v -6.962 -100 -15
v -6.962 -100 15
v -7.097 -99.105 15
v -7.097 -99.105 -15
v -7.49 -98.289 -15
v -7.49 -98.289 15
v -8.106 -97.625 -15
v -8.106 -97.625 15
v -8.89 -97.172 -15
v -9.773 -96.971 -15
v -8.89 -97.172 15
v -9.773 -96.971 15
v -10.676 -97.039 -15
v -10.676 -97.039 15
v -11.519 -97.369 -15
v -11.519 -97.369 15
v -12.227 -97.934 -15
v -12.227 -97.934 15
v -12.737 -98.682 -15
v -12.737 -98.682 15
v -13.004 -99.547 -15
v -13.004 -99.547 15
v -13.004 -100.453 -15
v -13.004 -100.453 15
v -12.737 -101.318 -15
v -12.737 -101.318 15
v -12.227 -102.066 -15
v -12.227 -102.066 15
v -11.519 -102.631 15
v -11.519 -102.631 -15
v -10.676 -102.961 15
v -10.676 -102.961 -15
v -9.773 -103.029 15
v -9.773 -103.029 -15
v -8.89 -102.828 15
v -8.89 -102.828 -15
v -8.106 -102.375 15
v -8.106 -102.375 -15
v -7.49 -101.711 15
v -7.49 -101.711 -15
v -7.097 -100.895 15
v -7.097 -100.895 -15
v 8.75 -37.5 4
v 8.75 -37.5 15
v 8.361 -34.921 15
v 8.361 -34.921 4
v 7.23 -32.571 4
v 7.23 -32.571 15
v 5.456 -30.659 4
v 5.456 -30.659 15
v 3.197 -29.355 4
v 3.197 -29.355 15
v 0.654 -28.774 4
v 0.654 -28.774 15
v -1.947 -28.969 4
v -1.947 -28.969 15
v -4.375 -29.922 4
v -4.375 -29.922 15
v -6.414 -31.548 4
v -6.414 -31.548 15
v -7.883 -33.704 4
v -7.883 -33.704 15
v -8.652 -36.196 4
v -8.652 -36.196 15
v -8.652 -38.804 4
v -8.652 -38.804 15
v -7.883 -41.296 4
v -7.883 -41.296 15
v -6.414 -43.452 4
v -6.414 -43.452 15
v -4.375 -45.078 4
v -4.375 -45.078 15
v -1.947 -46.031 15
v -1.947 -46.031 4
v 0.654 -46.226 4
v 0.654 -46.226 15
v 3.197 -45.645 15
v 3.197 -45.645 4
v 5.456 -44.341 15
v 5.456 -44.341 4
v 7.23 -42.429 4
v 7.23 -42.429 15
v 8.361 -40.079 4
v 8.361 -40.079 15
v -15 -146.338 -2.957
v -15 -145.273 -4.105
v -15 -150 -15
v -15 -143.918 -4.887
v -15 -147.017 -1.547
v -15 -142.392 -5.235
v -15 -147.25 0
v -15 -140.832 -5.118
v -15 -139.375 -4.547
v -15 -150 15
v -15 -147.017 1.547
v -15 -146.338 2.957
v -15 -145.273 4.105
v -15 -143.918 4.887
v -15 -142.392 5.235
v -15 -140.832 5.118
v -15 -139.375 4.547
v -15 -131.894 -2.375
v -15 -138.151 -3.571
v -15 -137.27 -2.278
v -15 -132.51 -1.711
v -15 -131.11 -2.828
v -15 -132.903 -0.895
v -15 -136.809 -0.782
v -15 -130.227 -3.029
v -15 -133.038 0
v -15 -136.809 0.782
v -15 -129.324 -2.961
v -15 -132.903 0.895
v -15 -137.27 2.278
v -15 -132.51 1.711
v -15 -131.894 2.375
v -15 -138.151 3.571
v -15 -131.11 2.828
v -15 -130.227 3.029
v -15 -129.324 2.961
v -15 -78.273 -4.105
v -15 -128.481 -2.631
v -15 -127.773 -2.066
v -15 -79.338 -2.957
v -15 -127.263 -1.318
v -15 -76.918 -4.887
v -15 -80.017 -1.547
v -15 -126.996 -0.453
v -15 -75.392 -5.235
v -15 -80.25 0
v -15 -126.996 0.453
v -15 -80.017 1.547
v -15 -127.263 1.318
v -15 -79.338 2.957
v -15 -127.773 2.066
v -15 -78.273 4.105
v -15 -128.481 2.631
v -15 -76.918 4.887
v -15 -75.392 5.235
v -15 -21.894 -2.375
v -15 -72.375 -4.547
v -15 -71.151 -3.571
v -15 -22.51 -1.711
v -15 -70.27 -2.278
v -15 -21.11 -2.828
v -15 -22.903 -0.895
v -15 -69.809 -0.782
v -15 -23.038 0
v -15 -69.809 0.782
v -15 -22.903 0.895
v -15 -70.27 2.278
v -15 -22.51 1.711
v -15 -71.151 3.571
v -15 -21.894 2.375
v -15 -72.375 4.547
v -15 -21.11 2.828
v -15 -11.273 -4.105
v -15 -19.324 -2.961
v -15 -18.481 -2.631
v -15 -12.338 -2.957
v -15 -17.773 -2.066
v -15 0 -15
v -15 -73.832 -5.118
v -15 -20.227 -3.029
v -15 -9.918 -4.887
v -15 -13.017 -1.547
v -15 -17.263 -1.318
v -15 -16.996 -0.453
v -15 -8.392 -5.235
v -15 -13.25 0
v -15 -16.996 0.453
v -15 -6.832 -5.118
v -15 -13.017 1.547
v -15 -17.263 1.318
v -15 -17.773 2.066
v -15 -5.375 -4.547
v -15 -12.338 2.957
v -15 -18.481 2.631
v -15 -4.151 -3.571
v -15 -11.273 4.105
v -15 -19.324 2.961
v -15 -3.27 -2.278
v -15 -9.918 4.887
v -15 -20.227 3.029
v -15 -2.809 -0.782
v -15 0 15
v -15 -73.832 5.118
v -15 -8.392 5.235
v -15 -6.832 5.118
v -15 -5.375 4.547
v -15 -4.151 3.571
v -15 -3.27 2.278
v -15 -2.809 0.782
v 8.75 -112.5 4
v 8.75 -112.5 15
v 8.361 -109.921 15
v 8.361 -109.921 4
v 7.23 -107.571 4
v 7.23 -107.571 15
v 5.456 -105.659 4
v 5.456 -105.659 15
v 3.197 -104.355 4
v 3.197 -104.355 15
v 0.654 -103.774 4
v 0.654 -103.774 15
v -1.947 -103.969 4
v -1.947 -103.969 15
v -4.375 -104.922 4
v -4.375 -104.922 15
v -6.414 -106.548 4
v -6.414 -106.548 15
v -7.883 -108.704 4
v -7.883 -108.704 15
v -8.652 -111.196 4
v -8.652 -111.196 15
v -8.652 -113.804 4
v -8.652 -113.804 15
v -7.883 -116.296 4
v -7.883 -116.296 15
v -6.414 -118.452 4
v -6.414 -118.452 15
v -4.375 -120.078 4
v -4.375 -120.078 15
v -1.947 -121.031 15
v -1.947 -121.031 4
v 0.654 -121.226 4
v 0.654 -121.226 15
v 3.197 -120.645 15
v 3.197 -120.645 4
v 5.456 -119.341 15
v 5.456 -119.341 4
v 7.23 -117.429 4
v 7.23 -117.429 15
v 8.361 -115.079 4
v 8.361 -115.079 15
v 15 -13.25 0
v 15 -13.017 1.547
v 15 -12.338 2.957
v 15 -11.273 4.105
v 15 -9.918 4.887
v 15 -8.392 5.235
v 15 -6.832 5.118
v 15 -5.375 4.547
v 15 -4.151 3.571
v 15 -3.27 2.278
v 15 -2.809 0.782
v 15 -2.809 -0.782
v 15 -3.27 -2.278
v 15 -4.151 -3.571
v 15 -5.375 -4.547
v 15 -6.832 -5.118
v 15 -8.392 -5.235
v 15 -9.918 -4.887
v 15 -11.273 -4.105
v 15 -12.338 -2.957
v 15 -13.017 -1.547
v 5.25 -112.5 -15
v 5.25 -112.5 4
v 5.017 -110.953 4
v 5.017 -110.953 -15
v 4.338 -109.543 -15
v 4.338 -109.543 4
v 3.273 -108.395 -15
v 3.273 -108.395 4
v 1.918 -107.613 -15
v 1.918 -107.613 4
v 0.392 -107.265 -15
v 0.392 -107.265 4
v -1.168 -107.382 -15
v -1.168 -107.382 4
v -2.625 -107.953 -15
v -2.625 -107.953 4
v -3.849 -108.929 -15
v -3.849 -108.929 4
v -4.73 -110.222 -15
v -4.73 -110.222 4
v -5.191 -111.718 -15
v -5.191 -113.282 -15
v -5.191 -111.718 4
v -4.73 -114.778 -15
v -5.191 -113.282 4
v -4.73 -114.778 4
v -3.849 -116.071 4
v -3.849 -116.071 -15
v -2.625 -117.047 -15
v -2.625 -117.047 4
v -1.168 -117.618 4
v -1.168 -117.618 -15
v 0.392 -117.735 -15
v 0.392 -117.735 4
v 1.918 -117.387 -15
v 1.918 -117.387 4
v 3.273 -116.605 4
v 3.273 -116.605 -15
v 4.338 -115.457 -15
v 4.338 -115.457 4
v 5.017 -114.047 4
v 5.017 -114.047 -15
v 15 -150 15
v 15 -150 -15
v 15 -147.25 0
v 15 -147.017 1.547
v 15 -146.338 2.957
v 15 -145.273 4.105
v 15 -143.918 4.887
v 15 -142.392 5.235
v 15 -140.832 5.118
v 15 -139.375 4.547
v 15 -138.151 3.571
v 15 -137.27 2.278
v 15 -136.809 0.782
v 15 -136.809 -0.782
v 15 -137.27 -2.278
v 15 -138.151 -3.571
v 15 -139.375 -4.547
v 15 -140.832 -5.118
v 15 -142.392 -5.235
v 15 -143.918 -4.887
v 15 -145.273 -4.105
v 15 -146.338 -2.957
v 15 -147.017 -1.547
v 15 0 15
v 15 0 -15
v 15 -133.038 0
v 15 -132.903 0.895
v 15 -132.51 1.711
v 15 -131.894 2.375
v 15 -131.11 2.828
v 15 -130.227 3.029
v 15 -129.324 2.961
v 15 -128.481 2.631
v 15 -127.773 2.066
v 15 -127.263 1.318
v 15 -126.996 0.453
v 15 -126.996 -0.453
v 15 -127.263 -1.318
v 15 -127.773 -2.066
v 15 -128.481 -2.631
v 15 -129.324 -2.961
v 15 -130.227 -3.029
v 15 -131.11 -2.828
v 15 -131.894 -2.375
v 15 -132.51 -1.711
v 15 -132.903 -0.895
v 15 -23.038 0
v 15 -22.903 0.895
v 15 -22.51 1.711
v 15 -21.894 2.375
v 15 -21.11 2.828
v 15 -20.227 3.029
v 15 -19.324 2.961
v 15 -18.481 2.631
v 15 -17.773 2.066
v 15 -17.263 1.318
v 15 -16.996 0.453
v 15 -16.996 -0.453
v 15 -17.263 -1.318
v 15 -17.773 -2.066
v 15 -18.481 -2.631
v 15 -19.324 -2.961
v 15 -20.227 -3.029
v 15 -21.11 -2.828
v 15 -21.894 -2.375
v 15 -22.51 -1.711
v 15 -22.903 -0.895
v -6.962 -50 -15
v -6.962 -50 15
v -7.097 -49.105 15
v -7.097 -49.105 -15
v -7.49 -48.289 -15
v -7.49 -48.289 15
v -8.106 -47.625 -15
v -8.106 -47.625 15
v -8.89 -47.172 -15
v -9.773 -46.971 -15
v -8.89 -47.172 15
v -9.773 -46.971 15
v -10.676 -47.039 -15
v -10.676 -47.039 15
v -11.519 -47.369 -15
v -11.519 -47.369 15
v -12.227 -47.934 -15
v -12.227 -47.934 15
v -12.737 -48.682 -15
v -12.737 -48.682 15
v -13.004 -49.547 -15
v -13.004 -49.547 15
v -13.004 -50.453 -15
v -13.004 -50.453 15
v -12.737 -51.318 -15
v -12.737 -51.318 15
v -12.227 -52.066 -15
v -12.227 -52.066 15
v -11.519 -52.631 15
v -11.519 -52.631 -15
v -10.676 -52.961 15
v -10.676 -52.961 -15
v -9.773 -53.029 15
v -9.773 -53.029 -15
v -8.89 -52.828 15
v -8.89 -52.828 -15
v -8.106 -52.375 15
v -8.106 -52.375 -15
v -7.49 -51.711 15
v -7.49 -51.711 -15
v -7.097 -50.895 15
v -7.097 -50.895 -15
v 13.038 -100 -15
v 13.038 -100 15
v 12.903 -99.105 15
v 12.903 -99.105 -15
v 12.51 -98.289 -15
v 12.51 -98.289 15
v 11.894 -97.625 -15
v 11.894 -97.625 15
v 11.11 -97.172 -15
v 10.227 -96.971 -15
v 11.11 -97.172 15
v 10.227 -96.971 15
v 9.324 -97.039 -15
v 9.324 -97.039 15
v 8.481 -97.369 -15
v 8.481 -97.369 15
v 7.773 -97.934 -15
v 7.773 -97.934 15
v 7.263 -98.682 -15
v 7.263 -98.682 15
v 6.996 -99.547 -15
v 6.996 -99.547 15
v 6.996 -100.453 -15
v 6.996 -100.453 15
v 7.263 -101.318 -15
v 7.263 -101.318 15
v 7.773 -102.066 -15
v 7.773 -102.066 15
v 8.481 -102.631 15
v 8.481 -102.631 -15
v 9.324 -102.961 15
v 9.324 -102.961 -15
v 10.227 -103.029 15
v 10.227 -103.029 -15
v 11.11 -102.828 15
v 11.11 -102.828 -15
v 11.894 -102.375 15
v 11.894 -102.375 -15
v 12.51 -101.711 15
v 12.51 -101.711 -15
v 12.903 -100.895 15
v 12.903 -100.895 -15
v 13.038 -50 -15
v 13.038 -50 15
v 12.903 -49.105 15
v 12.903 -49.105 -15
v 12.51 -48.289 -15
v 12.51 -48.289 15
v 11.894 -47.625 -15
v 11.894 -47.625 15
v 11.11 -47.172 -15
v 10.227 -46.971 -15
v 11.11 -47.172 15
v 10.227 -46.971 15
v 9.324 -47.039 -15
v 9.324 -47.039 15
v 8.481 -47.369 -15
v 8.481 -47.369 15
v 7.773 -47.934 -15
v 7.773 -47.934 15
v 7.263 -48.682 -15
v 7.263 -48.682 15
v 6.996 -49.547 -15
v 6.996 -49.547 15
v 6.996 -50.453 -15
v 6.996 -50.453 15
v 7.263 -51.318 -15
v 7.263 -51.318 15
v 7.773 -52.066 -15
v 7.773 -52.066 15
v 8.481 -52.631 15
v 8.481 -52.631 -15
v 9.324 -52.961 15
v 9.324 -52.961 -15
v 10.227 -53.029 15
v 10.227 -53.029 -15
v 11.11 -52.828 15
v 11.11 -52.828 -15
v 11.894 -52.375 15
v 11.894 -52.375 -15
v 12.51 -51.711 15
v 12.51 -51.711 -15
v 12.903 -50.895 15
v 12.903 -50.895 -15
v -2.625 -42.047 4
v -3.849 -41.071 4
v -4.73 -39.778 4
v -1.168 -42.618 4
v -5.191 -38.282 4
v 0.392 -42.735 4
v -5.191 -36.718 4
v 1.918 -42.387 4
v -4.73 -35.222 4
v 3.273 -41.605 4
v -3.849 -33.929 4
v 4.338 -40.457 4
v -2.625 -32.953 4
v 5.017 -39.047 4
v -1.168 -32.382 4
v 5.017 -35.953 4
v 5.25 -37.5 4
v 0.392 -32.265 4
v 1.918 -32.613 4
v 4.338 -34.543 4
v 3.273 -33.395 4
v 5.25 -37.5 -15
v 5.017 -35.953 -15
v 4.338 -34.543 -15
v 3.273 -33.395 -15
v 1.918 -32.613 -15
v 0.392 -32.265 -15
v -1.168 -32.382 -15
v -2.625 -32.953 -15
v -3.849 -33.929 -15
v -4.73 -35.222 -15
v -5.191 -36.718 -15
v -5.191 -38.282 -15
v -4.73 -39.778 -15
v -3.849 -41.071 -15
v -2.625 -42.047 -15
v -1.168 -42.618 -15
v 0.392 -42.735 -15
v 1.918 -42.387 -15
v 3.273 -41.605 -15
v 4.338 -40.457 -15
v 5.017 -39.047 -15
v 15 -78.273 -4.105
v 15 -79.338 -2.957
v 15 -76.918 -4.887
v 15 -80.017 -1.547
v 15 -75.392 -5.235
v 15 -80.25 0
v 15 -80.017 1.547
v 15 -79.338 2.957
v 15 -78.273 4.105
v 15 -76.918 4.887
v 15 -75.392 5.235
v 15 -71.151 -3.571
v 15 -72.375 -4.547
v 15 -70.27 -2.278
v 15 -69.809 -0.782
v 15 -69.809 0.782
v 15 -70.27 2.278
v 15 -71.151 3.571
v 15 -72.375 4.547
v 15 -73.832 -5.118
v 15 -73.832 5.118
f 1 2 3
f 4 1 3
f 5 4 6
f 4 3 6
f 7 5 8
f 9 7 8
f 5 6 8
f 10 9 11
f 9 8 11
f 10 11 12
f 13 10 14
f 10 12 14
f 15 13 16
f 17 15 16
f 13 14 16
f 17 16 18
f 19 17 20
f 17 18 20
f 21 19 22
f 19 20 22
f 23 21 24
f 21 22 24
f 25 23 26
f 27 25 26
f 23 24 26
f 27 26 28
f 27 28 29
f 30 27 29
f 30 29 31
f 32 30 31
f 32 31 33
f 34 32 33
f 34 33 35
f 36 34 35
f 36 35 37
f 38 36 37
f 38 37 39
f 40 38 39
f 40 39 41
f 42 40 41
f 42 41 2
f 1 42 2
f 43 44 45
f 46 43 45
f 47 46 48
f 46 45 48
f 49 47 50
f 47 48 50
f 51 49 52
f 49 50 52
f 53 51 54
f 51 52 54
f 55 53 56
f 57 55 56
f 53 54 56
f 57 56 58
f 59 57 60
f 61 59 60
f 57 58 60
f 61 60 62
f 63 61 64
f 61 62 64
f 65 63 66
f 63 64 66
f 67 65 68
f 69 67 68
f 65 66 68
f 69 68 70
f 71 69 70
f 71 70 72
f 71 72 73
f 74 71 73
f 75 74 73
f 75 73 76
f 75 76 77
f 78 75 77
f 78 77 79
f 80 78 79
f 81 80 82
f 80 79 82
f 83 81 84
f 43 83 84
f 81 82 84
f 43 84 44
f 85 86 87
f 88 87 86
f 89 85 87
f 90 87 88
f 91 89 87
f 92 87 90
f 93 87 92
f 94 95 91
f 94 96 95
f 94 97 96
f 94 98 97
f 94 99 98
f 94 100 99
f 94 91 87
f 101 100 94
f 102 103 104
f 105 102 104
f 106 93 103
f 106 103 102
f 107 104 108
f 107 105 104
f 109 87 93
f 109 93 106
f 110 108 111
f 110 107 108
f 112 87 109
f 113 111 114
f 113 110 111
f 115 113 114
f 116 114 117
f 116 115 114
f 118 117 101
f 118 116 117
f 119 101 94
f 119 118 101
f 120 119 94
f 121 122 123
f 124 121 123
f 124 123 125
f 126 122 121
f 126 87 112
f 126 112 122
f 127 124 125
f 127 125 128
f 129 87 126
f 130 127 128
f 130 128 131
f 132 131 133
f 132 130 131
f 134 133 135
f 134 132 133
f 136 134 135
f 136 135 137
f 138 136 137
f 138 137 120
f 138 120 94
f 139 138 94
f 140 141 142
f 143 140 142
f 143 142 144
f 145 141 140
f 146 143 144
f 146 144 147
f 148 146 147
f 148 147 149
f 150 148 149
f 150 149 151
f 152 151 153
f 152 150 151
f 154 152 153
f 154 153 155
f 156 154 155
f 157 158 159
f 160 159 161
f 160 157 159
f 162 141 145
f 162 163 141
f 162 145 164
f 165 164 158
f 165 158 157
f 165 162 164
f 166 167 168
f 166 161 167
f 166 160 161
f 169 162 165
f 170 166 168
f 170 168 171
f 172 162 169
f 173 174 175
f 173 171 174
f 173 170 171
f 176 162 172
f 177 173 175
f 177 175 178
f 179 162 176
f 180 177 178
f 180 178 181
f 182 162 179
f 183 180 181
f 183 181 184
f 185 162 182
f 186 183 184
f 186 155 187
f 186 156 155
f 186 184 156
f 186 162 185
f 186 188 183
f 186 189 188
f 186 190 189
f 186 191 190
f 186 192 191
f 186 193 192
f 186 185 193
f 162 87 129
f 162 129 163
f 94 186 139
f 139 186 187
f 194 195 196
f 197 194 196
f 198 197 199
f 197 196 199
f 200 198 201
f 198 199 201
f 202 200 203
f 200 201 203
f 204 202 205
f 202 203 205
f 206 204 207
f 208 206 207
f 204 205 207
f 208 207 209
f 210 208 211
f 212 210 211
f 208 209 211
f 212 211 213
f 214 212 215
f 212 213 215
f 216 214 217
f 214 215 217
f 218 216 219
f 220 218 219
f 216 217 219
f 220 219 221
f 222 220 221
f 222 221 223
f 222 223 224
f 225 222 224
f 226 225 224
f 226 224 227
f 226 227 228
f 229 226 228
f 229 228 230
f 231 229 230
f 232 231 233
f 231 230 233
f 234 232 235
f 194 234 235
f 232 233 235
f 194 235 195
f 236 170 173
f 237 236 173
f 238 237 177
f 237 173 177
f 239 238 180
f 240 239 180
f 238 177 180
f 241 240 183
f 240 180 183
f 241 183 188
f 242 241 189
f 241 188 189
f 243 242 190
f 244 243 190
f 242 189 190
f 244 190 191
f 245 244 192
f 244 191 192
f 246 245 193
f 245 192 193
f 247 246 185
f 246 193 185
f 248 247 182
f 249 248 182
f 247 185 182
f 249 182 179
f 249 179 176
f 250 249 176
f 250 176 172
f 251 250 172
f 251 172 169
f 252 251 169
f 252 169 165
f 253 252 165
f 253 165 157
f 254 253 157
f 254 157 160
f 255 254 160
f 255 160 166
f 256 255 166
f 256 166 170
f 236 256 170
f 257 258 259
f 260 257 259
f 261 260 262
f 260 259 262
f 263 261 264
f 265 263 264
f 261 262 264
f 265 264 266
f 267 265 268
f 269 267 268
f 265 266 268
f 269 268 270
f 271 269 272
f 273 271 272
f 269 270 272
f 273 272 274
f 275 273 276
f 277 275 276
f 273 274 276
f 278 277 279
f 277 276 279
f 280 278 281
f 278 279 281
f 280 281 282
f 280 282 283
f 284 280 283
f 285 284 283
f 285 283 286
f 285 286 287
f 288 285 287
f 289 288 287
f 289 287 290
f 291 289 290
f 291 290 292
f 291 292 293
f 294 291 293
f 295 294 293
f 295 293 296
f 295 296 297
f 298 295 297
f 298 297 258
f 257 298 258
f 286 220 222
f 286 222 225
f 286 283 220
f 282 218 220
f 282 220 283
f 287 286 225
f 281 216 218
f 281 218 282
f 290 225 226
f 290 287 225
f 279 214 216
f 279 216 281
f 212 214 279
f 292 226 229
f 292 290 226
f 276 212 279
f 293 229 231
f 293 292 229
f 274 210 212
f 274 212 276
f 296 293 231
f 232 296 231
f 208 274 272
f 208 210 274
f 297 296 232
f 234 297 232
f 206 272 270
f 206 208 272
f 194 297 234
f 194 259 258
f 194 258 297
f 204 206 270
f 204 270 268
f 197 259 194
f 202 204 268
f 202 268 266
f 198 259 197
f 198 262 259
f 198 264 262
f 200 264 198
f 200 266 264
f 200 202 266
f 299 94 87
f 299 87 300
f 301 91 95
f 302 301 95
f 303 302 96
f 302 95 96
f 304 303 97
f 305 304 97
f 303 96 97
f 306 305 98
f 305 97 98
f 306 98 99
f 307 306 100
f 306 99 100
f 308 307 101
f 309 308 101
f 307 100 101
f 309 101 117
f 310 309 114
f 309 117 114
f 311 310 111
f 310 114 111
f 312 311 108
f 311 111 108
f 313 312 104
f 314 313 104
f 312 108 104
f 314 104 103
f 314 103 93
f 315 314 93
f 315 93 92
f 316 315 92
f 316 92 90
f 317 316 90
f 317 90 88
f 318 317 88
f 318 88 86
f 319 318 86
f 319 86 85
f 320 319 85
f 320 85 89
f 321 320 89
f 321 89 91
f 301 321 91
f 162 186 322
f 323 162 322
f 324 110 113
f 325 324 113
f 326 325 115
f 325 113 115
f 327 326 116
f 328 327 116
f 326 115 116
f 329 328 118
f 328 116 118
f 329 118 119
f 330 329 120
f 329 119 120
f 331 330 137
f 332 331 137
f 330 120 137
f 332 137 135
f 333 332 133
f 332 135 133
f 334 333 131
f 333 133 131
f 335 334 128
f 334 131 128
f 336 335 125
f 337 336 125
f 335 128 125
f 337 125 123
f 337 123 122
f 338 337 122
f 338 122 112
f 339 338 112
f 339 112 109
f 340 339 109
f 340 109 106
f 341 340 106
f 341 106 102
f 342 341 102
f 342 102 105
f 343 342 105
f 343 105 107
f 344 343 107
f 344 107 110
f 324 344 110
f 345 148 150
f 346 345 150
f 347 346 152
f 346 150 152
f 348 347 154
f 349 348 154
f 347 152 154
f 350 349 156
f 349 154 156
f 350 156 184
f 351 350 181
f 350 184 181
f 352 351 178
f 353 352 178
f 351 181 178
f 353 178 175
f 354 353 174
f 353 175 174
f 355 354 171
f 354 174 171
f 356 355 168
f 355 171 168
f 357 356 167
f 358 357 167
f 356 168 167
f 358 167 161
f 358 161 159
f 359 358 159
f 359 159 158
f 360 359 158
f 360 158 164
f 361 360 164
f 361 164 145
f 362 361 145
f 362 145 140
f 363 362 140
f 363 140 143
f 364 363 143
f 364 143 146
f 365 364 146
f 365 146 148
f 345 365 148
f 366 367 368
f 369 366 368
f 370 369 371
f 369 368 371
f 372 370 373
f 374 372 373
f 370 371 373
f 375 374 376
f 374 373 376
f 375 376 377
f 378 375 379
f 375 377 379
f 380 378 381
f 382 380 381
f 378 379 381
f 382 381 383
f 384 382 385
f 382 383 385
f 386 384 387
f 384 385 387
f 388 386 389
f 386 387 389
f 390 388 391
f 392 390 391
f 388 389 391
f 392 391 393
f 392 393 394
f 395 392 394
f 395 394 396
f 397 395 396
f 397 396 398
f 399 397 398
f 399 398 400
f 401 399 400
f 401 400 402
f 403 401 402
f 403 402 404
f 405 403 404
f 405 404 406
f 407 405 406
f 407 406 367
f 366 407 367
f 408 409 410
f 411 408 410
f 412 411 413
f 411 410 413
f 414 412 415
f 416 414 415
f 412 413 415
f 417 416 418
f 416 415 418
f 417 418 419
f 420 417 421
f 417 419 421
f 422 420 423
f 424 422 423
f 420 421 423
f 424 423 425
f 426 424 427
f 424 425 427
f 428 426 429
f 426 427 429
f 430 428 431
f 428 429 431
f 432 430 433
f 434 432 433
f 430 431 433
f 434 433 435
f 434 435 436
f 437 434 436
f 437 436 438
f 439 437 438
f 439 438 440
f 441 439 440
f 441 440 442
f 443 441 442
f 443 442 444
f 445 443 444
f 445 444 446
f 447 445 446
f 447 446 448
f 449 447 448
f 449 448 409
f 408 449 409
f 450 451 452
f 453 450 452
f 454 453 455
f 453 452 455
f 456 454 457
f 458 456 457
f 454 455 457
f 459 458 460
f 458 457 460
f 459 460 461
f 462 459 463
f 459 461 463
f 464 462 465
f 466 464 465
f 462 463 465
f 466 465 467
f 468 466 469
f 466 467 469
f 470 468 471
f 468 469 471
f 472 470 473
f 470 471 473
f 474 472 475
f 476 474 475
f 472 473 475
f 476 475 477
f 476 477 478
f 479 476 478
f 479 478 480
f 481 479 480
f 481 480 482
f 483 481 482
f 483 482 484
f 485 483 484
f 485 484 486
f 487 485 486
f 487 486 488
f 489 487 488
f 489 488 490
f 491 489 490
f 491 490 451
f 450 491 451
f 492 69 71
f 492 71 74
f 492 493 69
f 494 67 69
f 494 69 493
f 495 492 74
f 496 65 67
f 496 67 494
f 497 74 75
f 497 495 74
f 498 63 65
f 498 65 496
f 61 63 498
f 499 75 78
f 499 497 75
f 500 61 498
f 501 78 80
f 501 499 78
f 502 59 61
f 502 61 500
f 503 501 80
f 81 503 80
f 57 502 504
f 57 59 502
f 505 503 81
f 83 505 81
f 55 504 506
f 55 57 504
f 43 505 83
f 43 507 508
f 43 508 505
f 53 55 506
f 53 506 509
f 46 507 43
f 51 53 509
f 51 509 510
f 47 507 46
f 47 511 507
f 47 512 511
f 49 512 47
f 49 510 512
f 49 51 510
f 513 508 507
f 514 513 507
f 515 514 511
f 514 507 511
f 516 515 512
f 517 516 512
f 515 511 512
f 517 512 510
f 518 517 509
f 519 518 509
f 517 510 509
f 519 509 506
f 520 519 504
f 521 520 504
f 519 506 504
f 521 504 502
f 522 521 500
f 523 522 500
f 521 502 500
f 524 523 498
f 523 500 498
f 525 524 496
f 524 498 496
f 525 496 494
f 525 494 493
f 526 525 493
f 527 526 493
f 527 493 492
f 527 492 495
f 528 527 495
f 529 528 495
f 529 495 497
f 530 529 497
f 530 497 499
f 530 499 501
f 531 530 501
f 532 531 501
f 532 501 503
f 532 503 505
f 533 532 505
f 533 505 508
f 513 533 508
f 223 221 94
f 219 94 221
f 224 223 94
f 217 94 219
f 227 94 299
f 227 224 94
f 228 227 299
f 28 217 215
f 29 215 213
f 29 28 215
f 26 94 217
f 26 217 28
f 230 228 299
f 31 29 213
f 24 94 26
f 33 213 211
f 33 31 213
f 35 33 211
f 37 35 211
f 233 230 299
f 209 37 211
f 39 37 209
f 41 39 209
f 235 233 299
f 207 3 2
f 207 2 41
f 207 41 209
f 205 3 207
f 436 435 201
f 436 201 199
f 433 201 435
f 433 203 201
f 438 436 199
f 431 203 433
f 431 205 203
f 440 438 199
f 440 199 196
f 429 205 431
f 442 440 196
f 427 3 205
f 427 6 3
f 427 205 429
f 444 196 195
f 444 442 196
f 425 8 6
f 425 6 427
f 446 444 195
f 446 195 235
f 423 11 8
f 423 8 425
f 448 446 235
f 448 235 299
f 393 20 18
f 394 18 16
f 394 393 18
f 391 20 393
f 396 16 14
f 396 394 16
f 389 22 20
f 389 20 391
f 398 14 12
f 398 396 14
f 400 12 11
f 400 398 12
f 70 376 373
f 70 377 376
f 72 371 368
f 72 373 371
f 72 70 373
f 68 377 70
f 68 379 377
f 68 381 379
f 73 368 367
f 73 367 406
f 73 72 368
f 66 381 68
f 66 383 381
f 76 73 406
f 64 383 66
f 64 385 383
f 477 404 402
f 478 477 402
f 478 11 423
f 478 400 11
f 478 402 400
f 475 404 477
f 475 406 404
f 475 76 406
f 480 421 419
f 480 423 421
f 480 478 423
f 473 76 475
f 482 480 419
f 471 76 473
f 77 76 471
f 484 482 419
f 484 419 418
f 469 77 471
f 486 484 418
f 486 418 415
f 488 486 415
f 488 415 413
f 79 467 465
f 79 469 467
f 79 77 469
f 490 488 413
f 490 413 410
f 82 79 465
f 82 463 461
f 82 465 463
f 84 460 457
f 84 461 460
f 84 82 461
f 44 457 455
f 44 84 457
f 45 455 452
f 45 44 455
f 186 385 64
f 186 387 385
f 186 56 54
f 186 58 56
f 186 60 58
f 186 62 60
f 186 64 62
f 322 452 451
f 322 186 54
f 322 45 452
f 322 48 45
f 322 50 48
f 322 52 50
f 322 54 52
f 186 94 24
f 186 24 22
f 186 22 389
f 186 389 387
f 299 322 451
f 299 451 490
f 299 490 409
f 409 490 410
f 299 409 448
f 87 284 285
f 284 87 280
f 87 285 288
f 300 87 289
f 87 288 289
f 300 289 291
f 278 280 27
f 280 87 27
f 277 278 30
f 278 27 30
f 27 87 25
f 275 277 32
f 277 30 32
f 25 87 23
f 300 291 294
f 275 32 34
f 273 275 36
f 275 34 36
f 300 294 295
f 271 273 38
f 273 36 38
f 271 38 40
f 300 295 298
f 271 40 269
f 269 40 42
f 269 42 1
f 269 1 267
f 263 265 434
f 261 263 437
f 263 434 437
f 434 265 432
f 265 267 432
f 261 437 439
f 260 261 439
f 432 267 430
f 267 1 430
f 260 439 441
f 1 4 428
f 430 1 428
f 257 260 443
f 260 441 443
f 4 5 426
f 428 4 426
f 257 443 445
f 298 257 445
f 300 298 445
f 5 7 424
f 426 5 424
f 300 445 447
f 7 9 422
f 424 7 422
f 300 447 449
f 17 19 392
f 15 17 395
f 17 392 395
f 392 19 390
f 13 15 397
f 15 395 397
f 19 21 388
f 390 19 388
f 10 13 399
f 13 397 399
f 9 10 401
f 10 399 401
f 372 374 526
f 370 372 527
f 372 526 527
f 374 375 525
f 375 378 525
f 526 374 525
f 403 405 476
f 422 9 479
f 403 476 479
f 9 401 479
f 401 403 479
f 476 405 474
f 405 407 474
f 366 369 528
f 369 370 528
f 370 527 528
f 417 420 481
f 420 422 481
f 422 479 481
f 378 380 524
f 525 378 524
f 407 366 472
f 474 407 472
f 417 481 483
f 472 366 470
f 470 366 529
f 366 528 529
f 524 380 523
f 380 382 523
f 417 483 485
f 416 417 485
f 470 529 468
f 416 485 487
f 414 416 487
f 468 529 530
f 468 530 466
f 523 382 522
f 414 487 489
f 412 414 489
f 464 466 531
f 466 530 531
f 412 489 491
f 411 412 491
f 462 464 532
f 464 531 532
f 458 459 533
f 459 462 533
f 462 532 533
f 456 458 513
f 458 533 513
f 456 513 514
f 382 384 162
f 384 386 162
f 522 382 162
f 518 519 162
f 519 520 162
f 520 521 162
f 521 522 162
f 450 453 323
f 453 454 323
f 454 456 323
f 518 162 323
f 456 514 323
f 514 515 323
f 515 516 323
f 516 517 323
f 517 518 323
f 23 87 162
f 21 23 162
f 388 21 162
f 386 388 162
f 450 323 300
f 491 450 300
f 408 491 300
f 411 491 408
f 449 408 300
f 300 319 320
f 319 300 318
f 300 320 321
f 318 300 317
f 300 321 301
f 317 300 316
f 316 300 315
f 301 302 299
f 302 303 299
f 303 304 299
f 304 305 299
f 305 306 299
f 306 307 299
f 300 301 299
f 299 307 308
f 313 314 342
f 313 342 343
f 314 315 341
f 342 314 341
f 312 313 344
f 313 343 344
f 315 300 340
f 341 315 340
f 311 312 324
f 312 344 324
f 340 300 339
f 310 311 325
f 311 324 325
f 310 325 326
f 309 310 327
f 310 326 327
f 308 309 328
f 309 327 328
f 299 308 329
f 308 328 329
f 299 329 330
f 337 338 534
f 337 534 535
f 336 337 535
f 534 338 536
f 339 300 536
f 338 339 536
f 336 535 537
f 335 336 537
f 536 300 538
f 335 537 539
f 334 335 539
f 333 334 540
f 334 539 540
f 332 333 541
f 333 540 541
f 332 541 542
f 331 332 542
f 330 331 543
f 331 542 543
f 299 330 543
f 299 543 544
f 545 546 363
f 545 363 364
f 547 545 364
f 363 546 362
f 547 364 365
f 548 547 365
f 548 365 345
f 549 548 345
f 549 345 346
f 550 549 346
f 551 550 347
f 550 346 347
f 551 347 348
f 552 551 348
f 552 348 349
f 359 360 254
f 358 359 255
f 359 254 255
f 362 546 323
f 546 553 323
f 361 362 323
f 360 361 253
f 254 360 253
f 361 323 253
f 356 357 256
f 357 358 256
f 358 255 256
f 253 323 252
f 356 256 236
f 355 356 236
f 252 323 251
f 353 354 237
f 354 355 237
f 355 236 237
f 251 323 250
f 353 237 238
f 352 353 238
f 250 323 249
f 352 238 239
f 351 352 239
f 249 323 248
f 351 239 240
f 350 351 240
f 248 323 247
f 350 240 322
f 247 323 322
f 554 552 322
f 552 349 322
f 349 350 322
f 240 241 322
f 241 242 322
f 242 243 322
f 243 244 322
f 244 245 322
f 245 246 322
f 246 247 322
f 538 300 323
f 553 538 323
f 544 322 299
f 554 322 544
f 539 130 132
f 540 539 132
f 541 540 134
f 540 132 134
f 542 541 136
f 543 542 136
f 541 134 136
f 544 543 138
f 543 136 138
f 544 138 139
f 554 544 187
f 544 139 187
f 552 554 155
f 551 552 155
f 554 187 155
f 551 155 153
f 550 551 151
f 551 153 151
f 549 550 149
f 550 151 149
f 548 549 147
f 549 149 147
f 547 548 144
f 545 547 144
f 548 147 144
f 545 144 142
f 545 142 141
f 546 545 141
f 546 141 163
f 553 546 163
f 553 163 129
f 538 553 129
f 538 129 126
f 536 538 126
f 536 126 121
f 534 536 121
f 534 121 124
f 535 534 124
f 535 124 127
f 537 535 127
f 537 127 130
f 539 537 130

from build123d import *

# Parameters (mm, degrees)
F0_W     = 30
F0_H     = 30
F1_DEPTH = 150
F2_R     = 5.25
F3_DEPTH = 30.001
F4_R     = 5.25
F4_R_2   = 3.0375
F5_DEPTH = 30.001
F6_R     = 8.75
F7_DEPTH = 11
F8_R     = 3.0375
F9_DEPTH = 30.001


with BuildPart() as f1:
    # F0 (on Front) → F1 (new body)
    with BuildSketch(Plane.XZ):
        Rectangle(F0_W, F0_H)
    extrude(amount=F1_DEPTH)

    # F2 (on face) → F3 (cut, through all)
    with BuildSketch(Plane(origin=(-15, 0, 0), x_dir=(0, -1, 0), z_dir=(-1, 0, 0))):
        with Locations((8, 0)):
            Circle(F2_R)
        with Locations((75, 0)):
            Circle(F2_R)
        with Locations((142, 0)):
            Circle(F2_R)
    extrude(amount=-F3_DEPTH, mode=Mode.SUBTRACT)

    # F4 (on face) → F5 (cut, through all)
    with BuildSketch(Plane.XY.offset(15)):
        with Locations((0, -37.5)):
            Circle(F4_R)
        with Locations((10, -50)):
            Circle(F4_R_2)
        with Locations((0, -112.5)):
            Circle(F4_R)
        with Locations((10, -100)):
            Circle(F4_R_2)
        with Locations((-10, -50)):
            Circle(F4_R_2)
        with Locations((-10, -100)):
            Circle(F4_R_2)
    extrude(amount=-F5_DEPTH, mode=Mode.SUBTRACT)

    # F6 (on face) → F7 (cut)
    with BuildSketch(Plane.XY.offset(15)):
        with Locations((0, -37.5)):
            Circle(F6_R)
        with Locations((0, -112.5)):
            Circle(F6_R)
    extrude(amount=-F7_DEPTH, mode=Mode.SUBTRACT)

    # F8 (on face) → F9 (cut, through all)
    with BuildSketch(Plane(origin=(-15, 0, 0), x_dir=(0, -1, 0), z_dir=(-1, 0, 0))):
        with Locations((20, 0)):
            Circle(F8_R)
        with Locations((130, 0)):
            Circle(F8_R)
    extrude(amount=-F9_DEPTH, mode=Mode.SUBTRACT)


solid = f1.part
